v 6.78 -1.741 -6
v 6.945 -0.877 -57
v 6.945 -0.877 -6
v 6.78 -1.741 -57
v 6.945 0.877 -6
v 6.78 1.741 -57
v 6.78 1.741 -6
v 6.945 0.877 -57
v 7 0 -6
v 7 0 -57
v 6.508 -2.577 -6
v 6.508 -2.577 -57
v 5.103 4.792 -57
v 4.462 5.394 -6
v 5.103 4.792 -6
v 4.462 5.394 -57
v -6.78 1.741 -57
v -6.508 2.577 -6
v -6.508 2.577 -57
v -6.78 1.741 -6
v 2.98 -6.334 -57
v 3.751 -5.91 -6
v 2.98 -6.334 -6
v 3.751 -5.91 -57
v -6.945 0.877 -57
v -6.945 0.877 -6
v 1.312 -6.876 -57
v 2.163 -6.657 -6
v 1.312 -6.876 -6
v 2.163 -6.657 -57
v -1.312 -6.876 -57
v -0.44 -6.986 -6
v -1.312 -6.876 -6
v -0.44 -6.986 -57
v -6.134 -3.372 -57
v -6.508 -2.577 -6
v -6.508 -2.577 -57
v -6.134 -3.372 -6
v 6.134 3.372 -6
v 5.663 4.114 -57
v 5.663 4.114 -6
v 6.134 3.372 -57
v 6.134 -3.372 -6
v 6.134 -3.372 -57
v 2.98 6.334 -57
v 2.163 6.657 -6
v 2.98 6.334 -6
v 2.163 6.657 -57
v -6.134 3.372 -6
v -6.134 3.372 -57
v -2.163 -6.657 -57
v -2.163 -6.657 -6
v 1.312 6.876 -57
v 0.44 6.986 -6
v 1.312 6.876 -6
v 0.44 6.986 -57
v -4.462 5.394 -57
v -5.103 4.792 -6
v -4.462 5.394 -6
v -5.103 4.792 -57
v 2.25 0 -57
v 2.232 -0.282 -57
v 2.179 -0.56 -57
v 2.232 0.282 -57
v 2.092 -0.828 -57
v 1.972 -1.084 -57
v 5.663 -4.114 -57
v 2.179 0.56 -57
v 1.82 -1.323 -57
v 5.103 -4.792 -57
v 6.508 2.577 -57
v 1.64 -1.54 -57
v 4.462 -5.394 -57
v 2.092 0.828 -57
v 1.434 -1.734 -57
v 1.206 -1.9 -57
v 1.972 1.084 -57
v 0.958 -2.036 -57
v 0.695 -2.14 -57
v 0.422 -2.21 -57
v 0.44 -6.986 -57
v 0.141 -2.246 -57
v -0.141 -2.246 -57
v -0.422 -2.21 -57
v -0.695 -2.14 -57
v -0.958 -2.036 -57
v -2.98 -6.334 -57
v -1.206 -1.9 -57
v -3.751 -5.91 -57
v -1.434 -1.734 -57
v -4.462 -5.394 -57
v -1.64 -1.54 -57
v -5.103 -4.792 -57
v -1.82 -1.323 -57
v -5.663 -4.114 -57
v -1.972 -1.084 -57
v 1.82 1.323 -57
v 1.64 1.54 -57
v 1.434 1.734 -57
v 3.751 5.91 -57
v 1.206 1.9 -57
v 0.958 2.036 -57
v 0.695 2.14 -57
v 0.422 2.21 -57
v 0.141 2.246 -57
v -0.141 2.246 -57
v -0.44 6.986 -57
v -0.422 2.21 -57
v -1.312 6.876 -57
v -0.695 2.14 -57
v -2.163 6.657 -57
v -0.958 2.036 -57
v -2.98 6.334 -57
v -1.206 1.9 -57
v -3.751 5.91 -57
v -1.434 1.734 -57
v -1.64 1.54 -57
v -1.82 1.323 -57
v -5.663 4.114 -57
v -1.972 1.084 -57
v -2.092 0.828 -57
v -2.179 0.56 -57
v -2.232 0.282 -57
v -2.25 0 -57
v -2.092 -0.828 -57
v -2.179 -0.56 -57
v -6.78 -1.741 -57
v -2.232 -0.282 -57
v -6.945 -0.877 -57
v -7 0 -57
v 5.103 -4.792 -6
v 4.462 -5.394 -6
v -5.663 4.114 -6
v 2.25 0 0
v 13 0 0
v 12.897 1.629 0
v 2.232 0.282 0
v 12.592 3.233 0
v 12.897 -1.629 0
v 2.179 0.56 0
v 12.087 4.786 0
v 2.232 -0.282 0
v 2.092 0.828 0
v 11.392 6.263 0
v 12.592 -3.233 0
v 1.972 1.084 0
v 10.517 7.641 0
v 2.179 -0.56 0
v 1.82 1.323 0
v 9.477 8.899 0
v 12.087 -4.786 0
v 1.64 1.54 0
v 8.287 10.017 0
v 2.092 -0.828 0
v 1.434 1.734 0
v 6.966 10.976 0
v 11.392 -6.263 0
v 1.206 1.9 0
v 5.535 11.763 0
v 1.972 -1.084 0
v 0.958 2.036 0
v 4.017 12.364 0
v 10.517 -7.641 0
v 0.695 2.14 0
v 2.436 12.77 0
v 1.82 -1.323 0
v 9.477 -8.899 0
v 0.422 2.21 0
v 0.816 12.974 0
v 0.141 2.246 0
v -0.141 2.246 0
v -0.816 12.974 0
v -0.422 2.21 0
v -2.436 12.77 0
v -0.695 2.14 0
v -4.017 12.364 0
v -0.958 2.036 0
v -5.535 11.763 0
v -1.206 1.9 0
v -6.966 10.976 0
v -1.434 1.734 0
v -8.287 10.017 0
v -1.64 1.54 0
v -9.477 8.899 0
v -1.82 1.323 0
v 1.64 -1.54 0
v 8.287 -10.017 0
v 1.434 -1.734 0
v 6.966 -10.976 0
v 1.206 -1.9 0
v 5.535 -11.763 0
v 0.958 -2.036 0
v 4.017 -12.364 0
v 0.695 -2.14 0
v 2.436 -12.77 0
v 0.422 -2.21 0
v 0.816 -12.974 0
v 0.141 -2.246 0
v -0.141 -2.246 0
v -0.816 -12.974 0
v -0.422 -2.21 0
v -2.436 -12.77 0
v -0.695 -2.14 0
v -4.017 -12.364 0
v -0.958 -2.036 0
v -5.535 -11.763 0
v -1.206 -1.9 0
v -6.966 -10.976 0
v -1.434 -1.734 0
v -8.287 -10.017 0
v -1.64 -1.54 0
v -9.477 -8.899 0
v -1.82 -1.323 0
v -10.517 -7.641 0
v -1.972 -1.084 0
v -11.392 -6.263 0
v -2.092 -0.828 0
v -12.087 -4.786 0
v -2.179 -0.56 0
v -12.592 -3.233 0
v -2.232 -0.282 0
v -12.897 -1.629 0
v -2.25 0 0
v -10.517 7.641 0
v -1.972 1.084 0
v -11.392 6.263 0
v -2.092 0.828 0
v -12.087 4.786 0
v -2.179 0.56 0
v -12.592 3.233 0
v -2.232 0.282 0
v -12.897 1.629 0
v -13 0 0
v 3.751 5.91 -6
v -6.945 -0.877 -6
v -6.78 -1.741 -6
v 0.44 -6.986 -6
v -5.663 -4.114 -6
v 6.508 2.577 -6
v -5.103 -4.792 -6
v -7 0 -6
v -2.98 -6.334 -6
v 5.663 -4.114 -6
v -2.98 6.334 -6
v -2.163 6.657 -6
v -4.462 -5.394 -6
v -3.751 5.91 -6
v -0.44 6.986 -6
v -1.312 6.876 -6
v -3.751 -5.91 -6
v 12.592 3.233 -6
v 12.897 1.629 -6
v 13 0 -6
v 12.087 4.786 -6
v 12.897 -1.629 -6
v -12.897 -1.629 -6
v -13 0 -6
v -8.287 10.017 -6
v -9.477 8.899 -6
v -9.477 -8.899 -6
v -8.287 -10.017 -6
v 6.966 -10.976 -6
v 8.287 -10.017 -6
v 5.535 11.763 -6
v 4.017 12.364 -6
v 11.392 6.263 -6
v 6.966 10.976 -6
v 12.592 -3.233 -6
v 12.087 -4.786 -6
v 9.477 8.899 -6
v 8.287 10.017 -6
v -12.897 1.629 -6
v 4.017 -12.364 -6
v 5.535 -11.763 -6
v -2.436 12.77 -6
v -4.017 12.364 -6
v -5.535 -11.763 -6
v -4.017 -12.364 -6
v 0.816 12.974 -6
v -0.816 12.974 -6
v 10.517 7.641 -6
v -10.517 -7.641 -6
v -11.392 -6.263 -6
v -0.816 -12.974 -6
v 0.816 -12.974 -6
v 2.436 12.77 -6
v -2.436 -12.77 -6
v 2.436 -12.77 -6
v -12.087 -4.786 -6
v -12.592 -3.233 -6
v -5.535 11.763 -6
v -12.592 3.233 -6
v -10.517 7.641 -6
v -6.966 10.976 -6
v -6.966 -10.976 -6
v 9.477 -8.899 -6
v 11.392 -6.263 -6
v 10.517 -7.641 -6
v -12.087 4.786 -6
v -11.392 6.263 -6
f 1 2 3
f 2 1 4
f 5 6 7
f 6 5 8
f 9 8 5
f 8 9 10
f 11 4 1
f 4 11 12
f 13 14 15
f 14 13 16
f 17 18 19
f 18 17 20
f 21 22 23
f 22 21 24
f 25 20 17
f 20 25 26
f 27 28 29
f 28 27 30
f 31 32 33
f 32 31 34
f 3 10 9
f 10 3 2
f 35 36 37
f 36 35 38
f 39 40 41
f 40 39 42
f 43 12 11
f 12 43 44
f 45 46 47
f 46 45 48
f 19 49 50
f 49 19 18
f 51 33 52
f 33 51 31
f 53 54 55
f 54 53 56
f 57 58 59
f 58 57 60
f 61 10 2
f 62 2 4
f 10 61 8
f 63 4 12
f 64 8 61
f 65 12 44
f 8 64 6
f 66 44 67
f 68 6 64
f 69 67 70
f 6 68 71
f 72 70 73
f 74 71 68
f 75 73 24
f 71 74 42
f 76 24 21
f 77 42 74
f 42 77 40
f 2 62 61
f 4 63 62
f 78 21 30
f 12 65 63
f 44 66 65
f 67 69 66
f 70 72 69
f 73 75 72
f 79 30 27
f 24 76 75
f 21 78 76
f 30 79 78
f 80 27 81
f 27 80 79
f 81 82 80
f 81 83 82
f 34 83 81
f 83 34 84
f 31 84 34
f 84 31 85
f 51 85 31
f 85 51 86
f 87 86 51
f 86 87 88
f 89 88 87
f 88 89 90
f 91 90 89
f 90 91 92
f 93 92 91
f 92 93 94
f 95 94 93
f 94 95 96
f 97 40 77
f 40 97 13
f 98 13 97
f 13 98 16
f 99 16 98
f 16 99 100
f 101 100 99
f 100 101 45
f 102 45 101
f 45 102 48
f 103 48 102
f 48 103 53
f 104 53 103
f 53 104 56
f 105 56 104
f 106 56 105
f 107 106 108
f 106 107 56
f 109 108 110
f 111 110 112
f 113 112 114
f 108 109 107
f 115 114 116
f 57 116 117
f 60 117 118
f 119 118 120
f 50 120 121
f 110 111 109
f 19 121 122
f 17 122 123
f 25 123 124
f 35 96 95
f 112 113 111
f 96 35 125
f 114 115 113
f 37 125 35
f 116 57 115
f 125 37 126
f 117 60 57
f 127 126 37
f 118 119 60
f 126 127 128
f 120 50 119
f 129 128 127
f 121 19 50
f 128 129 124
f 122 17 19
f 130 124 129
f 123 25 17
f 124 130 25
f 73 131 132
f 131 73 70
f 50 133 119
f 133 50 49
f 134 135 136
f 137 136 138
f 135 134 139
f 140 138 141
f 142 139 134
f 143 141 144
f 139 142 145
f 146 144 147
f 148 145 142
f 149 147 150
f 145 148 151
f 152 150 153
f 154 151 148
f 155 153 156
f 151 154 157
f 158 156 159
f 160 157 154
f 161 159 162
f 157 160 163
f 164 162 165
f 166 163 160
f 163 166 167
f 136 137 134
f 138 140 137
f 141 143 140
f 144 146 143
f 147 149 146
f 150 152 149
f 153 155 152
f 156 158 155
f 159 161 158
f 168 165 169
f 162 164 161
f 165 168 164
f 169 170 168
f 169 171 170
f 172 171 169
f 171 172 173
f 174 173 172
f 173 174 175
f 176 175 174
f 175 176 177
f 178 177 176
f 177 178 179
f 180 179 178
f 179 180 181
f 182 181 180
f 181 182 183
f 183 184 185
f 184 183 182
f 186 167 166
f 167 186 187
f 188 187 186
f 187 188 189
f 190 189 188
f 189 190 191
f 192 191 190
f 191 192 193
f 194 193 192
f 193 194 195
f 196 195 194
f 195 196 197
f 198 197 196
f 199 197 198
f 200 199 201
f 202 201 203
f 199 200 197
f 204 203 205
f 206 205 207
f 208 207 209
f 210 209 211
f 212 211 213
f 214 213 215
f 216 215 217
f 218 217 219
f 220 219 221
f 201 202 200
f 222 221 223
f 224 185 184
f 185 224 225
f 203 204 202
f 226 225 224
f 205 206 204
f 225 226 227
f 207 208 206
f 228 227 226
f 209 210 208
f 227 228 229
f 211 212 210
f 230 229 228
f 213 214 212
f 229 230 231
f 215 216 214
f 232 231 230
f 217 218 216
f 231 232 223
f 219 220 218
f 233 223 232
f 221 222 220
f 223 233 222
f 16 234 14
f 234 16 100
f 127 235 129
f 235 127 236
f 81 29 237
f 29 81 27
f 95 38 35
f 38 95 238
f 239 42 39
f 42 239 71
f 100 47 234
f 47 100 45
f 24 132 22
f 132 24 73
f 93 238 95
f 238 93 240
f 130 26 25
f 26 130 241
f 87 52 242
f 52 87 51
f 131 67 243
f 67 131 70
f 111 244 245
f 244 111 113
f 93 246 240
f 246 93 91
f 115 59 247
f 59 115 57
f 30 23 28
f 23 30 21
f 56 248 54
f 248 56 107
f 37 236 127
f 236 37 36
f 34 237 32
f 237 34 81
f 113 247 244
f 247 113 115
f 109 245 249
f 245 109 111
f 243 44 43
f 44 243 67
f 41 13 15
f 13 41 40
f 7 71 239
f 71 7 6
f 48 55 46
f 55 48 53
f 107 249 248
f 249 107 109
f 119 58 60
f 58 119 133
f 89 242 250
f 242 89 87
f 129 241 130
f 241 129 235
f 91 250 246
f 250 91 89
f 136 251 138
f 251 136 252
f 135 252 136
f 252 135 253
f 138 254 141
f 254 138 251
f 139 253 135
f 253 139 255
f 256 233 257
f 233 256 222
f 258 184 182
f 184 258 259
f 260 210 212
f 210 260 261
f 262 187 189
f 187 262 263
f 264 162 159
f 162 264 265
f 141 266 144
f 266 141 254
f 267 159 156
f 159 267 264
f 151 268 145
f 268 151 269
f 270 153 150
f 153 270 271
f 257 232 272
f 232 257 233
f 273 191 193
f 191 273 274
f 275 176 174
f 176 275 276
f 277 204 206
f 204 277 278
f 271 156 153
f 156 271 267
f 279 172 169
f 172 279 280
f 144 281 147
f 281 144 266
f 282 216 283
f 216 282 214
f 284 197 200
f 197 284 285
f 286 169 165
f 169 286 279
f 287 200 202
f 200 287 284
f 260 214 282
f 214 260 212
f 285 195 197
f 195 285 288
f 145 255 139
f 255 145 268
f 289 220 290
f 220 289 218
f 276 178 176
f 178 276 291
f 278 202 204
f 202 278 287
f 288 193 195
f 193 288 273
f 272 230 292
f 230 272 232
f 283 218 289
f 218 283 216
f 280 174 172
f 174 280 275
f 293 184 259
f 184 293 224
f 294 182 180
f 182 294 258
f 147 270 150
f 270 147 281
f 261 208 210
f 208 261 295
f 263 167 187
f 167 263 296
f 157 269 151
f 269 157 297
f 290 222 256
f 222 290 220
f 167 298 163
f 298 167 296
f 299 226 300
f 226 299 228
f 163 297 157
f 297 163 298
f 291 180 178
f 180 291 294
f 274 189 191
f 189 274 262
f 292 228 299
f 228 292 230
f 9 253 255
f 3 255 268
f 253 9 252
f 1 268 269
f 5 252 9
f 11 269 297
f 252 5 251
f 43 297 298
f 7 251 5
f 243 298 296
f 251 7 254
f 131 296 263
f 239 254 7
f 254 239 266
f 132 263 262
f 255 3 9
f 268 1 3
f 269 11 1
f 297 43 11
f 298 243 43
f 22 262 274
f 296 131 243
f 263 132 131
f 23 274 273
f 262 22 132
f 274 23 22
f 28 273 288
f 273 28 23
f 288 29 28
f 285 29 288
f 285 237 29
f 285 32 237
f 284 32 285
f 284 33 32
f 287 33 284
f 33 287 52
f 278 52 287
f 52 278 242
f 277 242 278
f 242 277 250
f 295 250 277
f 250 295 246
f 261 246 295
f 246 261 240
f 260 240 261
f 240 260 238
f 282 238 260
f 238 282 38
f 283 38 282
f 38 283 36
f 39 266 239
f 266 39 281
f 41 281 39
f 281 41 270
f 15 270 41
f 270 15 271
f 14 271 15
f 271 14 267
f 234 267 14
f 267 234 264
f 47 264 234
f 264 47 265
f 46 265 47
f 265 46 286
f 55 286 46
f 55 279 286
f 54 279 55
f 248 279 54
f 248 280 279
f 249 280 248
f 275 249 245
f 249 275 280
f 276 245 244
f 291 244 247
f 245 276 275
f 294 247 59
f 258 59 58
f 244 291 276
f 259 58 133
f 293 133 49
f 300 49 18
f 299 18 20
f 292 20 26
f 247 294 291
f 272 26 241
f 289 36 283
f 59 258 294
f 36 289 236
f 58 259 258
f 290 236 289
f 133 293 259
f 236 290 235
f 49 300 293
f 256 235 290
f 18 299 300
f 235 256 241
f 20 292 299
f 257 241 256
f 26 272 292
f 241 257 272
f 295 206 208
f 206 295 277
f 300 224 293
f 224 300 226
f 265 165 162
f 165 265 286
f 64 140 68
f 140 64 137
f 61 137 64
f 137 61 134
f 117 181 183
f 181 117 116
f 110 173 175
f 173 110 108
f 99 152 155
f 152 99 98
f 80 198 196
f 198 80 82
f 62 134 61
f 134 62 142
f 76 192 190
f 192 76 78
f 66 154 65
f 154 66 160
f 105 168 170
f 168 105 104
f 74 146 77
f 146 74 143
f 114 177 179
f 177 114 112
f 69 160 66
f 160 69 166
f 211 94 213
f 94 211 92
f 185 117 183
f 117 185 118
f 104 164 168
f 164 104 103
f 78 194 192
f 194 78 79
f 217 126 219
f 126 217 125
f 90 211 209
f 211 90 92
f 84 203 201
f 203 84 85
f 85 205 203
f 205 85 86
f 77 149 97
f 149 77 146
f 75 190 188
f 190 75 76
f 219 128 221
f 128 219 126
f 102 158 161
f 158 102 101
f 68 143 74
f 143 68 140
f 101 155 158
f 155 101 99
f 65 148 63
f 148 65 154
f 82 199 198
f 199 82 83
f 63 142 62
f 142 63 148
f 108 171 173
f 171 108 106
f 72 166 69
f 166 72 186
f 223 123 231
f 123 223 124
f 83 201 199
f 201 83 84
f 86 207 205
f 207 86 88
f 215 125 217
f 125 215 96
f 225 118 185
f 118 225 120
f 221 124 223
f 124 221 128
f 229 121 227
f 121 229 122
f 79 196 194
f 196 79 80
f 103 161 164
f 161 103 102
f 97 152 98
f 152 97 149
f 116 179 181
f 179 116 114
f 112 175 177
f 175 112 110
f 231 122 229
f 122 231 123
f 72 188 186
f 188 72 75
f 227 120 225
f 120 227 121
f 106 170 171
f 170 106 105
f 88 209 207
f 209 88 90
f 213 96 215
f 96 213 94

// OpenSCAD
$fn = 50;


difference() {
	union() {
		translate(v = [0, 0, -57.0000000000]) {
			cylinder(h = 57, r = 7.0000000000);
		}
		translate(v = [0, 0, -6.0000000000]) {
			cylinder(h = 6, r = 13.0000000000);
		}
	}
	union() {
		#translate(v = [0, 0, -57]) {
			cylinder(h = 57, r = 2.2500000000);
		}
	}
}
